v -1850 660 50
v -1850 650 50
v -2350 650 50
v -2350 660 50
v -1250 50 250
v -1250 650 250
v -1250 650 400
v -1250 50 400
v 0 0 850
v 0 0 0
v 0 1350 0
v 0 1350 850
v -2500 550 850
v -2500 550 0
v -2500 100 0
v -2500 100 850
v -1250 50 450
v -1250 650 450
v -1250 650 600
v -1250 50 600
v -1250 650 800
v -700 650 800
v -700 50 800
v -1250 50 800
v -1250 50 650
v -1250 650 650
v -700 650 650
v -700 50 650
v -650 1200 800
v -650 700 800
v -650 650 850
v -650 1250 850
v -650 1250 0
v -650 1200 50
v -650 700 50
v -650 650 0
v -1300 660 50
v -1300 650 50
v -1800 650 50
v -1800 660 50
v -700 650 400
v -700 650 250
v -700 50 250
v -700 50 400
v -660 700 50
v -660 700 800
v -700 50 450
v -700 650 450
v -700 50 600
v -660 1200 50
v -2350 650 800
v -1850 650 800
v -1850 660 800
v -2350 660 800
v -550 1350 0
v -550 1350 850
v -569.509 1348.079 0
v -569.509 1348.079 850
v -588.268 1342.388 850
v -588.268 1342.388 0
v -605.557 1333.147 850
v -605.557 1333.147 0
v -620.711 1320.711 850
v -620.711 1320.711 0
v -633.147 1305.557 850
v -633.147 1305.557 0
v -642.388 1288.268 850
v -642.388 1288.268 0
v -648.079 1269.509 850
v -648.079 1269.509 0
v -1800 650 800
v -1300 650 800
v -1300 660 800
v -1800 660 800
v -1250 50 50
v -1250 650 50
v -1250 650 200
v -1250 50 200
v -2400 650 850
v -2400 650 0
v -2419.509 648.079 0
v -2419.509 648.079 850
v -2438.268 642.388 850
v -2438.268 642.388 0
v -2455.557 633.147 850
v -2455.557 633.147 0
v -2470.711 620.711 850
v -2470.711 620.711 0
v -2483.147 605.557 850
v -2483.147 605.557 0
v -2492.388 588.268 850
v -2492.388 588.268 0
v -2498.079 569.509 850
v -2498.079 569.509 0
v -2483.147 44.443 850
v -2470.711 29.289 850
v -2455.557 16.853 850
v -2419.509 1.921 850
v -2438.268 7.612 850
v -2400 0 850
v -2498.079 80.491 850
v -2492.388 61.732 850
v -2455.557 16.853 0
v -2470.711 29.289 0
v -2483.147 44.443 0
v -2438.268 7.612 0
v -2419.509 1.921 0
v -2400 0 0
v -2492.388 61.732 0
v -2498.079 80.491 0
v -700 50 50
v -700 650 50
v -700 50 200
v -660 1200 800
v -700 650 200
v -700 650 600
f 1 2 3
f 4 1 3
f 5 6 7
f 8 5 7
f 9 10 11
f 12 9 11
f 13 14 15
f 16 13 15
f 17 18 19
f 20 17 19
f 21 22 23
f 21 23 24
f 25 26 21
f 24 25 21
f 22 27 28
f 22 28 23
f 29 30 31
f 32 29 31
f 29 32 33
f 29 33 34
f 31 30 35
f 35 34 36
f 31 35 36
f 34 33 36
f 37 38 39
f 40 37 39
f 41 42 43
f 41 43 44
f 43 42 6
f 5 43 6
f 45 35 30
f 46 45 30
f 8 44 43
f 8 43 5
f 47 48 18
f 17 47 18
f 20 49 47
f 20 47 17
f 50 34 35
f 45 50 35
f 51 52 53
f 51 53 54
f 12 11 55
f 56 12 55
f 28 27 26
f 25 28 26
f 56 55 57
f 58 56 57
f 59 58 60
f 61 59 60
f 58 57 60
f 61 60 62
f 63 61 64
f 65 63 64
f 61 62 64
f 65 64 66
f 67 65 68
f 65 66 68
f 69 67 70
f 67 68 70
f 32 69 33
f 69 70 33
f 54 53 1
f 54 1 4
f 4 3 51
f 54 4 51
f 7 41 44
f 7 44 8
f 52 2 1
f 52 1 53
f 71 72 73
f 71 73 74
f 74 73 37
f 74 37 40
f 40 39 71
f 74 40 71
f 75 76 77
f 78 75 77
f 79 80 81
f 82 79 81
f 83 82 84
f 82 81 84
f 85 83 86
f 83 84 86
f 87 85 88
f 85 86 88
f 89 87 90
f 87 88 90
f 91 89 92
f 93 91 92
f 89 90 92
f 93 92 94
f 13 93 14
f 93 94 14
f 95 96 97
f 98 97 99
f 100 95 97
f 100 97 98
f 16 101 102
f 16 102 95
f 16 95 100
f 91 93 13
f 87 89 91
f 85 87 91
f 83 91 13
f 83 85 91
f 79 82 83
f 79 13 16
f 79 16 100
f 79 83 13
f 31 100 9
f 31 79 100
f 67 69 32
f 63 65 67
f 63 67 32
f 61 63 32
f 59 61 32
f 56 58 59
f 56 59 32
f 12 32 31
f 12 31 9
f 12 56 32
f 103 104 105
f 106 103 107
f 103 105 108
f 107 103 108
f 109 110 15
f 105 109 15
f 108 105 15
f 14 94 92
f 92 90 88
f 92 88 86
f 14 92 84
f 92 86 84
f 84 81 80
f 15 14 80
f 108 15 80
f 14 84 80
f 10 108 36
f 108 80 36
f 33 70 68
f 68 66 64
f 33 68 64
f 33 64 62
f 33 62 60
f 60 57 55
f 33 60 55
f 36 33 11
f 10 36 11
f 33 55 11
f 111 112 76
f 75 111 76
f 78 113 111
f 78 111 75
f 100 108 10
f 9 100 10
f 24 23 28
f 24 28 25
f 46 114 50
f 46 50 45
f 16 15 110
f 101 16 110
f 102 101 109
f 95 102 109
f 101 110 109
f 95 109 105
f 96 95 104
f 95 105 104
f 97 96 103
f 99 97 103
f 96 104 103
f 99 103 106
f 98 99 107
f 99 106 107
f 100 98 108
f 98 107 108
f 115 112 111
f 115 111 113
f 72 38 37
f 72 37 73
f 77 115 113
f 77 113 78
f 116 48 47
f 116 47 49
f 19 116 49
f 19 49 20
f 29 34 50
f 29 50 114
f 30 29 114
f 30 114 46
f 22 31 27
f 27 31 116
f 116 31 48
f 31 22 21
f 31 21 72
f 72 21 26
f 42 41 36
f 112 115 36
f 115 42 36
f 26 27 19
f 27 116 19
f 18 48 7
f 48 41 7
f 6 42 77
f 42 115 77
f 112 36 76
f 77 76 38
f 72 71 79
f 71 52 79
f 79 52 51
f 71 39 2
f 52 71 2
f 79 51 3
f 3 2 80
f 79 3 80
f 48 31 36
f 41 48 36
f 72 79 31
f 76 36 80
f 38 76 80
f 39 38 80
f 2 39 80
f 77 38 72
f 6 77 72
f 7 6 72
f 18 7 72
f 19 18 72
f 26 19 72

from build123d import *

# Parameters (mm, degrees)
F1_DEPTH = 850
F2_W     = 550
F2_H     = 150
F4_DEPTH = 600
F2_W_2   = 500
F2_H_2   = 750
F5_DEPTH = 10
F3_W     = 500
F3_H     = 750
F8_DEPTH = 10


with BuildPart() as f1:
    # F0 (on Top) → F1 (new body)
    with BuildSketch(Plane.XY):
        with BuildLine():
            Line((-2400, 0), (0, 0))
            Line((0, 0), (0, 1350))
            Line((0, 1350), (-550, 1350))
            ThreePointArc((-550, 1350), (-620.710678, 1320.710678), (-650, 1250))
            Line((-650, 1250), (-650, 650))
            Line((-650, 650), (-2400, 650))
            ThreePointArc((-2400, 650), (-2470.710678, 620.710678), (-2500, 550))
            Line((-2500, 550), (-2500, 100))
            ThreePointArc((-2500, 100), (-2470.710678, 29.289322), (-2400, 0))
        make_face()
    extrude(amount=F1_DEPTH)

    # F2 (on face) → F4 (cut)
    with BuildSketch(Plane(origin=(0, 650, 0), x_dir=(-1, 0, 0), z_dir=(0, 1, 0))):
        with Locations((975, 725)):
            Rectangle(F2_W, F2_H)
        with Locations((975, 525)):
            Rectangle(F2_W, F2_H)
        with Locations((975, 325)):
            Rectangle(F2_W, F2_H)
        with Locations((975, 125)):
            Rectangle(F2_W, F2_H)
    extrude(amount=-F4_DEPTH, mode=Mode.SUBTRACT)

    # F2 (on face) → F5 (join)
    with BuildSketch(Plane(origin=(0, 650, 0), x_dir=(-1, 0, 0), z_dir=(0, 1, 0))):
        with Locations((1550, 425)):
            Rectangle(F2_W_2, F2_H_2)
        with Locations((2100, 425)):
            Rectangle(F2_W_2, F2_H_2)
    extrude(amount=F5_DEPTH)

    # F3 (on face) → F8 (join)
    with BuildSketch(Plane(origin=(-650, 0, 0), x_dir=(0, -1, 0), z_dir=(-1, 0, 0))):
        with Locations((-950, 425)):
            Rectangle(F3_W, F3_H)
    extrude(amount=F8_DEPTH)


solid = f1.part
